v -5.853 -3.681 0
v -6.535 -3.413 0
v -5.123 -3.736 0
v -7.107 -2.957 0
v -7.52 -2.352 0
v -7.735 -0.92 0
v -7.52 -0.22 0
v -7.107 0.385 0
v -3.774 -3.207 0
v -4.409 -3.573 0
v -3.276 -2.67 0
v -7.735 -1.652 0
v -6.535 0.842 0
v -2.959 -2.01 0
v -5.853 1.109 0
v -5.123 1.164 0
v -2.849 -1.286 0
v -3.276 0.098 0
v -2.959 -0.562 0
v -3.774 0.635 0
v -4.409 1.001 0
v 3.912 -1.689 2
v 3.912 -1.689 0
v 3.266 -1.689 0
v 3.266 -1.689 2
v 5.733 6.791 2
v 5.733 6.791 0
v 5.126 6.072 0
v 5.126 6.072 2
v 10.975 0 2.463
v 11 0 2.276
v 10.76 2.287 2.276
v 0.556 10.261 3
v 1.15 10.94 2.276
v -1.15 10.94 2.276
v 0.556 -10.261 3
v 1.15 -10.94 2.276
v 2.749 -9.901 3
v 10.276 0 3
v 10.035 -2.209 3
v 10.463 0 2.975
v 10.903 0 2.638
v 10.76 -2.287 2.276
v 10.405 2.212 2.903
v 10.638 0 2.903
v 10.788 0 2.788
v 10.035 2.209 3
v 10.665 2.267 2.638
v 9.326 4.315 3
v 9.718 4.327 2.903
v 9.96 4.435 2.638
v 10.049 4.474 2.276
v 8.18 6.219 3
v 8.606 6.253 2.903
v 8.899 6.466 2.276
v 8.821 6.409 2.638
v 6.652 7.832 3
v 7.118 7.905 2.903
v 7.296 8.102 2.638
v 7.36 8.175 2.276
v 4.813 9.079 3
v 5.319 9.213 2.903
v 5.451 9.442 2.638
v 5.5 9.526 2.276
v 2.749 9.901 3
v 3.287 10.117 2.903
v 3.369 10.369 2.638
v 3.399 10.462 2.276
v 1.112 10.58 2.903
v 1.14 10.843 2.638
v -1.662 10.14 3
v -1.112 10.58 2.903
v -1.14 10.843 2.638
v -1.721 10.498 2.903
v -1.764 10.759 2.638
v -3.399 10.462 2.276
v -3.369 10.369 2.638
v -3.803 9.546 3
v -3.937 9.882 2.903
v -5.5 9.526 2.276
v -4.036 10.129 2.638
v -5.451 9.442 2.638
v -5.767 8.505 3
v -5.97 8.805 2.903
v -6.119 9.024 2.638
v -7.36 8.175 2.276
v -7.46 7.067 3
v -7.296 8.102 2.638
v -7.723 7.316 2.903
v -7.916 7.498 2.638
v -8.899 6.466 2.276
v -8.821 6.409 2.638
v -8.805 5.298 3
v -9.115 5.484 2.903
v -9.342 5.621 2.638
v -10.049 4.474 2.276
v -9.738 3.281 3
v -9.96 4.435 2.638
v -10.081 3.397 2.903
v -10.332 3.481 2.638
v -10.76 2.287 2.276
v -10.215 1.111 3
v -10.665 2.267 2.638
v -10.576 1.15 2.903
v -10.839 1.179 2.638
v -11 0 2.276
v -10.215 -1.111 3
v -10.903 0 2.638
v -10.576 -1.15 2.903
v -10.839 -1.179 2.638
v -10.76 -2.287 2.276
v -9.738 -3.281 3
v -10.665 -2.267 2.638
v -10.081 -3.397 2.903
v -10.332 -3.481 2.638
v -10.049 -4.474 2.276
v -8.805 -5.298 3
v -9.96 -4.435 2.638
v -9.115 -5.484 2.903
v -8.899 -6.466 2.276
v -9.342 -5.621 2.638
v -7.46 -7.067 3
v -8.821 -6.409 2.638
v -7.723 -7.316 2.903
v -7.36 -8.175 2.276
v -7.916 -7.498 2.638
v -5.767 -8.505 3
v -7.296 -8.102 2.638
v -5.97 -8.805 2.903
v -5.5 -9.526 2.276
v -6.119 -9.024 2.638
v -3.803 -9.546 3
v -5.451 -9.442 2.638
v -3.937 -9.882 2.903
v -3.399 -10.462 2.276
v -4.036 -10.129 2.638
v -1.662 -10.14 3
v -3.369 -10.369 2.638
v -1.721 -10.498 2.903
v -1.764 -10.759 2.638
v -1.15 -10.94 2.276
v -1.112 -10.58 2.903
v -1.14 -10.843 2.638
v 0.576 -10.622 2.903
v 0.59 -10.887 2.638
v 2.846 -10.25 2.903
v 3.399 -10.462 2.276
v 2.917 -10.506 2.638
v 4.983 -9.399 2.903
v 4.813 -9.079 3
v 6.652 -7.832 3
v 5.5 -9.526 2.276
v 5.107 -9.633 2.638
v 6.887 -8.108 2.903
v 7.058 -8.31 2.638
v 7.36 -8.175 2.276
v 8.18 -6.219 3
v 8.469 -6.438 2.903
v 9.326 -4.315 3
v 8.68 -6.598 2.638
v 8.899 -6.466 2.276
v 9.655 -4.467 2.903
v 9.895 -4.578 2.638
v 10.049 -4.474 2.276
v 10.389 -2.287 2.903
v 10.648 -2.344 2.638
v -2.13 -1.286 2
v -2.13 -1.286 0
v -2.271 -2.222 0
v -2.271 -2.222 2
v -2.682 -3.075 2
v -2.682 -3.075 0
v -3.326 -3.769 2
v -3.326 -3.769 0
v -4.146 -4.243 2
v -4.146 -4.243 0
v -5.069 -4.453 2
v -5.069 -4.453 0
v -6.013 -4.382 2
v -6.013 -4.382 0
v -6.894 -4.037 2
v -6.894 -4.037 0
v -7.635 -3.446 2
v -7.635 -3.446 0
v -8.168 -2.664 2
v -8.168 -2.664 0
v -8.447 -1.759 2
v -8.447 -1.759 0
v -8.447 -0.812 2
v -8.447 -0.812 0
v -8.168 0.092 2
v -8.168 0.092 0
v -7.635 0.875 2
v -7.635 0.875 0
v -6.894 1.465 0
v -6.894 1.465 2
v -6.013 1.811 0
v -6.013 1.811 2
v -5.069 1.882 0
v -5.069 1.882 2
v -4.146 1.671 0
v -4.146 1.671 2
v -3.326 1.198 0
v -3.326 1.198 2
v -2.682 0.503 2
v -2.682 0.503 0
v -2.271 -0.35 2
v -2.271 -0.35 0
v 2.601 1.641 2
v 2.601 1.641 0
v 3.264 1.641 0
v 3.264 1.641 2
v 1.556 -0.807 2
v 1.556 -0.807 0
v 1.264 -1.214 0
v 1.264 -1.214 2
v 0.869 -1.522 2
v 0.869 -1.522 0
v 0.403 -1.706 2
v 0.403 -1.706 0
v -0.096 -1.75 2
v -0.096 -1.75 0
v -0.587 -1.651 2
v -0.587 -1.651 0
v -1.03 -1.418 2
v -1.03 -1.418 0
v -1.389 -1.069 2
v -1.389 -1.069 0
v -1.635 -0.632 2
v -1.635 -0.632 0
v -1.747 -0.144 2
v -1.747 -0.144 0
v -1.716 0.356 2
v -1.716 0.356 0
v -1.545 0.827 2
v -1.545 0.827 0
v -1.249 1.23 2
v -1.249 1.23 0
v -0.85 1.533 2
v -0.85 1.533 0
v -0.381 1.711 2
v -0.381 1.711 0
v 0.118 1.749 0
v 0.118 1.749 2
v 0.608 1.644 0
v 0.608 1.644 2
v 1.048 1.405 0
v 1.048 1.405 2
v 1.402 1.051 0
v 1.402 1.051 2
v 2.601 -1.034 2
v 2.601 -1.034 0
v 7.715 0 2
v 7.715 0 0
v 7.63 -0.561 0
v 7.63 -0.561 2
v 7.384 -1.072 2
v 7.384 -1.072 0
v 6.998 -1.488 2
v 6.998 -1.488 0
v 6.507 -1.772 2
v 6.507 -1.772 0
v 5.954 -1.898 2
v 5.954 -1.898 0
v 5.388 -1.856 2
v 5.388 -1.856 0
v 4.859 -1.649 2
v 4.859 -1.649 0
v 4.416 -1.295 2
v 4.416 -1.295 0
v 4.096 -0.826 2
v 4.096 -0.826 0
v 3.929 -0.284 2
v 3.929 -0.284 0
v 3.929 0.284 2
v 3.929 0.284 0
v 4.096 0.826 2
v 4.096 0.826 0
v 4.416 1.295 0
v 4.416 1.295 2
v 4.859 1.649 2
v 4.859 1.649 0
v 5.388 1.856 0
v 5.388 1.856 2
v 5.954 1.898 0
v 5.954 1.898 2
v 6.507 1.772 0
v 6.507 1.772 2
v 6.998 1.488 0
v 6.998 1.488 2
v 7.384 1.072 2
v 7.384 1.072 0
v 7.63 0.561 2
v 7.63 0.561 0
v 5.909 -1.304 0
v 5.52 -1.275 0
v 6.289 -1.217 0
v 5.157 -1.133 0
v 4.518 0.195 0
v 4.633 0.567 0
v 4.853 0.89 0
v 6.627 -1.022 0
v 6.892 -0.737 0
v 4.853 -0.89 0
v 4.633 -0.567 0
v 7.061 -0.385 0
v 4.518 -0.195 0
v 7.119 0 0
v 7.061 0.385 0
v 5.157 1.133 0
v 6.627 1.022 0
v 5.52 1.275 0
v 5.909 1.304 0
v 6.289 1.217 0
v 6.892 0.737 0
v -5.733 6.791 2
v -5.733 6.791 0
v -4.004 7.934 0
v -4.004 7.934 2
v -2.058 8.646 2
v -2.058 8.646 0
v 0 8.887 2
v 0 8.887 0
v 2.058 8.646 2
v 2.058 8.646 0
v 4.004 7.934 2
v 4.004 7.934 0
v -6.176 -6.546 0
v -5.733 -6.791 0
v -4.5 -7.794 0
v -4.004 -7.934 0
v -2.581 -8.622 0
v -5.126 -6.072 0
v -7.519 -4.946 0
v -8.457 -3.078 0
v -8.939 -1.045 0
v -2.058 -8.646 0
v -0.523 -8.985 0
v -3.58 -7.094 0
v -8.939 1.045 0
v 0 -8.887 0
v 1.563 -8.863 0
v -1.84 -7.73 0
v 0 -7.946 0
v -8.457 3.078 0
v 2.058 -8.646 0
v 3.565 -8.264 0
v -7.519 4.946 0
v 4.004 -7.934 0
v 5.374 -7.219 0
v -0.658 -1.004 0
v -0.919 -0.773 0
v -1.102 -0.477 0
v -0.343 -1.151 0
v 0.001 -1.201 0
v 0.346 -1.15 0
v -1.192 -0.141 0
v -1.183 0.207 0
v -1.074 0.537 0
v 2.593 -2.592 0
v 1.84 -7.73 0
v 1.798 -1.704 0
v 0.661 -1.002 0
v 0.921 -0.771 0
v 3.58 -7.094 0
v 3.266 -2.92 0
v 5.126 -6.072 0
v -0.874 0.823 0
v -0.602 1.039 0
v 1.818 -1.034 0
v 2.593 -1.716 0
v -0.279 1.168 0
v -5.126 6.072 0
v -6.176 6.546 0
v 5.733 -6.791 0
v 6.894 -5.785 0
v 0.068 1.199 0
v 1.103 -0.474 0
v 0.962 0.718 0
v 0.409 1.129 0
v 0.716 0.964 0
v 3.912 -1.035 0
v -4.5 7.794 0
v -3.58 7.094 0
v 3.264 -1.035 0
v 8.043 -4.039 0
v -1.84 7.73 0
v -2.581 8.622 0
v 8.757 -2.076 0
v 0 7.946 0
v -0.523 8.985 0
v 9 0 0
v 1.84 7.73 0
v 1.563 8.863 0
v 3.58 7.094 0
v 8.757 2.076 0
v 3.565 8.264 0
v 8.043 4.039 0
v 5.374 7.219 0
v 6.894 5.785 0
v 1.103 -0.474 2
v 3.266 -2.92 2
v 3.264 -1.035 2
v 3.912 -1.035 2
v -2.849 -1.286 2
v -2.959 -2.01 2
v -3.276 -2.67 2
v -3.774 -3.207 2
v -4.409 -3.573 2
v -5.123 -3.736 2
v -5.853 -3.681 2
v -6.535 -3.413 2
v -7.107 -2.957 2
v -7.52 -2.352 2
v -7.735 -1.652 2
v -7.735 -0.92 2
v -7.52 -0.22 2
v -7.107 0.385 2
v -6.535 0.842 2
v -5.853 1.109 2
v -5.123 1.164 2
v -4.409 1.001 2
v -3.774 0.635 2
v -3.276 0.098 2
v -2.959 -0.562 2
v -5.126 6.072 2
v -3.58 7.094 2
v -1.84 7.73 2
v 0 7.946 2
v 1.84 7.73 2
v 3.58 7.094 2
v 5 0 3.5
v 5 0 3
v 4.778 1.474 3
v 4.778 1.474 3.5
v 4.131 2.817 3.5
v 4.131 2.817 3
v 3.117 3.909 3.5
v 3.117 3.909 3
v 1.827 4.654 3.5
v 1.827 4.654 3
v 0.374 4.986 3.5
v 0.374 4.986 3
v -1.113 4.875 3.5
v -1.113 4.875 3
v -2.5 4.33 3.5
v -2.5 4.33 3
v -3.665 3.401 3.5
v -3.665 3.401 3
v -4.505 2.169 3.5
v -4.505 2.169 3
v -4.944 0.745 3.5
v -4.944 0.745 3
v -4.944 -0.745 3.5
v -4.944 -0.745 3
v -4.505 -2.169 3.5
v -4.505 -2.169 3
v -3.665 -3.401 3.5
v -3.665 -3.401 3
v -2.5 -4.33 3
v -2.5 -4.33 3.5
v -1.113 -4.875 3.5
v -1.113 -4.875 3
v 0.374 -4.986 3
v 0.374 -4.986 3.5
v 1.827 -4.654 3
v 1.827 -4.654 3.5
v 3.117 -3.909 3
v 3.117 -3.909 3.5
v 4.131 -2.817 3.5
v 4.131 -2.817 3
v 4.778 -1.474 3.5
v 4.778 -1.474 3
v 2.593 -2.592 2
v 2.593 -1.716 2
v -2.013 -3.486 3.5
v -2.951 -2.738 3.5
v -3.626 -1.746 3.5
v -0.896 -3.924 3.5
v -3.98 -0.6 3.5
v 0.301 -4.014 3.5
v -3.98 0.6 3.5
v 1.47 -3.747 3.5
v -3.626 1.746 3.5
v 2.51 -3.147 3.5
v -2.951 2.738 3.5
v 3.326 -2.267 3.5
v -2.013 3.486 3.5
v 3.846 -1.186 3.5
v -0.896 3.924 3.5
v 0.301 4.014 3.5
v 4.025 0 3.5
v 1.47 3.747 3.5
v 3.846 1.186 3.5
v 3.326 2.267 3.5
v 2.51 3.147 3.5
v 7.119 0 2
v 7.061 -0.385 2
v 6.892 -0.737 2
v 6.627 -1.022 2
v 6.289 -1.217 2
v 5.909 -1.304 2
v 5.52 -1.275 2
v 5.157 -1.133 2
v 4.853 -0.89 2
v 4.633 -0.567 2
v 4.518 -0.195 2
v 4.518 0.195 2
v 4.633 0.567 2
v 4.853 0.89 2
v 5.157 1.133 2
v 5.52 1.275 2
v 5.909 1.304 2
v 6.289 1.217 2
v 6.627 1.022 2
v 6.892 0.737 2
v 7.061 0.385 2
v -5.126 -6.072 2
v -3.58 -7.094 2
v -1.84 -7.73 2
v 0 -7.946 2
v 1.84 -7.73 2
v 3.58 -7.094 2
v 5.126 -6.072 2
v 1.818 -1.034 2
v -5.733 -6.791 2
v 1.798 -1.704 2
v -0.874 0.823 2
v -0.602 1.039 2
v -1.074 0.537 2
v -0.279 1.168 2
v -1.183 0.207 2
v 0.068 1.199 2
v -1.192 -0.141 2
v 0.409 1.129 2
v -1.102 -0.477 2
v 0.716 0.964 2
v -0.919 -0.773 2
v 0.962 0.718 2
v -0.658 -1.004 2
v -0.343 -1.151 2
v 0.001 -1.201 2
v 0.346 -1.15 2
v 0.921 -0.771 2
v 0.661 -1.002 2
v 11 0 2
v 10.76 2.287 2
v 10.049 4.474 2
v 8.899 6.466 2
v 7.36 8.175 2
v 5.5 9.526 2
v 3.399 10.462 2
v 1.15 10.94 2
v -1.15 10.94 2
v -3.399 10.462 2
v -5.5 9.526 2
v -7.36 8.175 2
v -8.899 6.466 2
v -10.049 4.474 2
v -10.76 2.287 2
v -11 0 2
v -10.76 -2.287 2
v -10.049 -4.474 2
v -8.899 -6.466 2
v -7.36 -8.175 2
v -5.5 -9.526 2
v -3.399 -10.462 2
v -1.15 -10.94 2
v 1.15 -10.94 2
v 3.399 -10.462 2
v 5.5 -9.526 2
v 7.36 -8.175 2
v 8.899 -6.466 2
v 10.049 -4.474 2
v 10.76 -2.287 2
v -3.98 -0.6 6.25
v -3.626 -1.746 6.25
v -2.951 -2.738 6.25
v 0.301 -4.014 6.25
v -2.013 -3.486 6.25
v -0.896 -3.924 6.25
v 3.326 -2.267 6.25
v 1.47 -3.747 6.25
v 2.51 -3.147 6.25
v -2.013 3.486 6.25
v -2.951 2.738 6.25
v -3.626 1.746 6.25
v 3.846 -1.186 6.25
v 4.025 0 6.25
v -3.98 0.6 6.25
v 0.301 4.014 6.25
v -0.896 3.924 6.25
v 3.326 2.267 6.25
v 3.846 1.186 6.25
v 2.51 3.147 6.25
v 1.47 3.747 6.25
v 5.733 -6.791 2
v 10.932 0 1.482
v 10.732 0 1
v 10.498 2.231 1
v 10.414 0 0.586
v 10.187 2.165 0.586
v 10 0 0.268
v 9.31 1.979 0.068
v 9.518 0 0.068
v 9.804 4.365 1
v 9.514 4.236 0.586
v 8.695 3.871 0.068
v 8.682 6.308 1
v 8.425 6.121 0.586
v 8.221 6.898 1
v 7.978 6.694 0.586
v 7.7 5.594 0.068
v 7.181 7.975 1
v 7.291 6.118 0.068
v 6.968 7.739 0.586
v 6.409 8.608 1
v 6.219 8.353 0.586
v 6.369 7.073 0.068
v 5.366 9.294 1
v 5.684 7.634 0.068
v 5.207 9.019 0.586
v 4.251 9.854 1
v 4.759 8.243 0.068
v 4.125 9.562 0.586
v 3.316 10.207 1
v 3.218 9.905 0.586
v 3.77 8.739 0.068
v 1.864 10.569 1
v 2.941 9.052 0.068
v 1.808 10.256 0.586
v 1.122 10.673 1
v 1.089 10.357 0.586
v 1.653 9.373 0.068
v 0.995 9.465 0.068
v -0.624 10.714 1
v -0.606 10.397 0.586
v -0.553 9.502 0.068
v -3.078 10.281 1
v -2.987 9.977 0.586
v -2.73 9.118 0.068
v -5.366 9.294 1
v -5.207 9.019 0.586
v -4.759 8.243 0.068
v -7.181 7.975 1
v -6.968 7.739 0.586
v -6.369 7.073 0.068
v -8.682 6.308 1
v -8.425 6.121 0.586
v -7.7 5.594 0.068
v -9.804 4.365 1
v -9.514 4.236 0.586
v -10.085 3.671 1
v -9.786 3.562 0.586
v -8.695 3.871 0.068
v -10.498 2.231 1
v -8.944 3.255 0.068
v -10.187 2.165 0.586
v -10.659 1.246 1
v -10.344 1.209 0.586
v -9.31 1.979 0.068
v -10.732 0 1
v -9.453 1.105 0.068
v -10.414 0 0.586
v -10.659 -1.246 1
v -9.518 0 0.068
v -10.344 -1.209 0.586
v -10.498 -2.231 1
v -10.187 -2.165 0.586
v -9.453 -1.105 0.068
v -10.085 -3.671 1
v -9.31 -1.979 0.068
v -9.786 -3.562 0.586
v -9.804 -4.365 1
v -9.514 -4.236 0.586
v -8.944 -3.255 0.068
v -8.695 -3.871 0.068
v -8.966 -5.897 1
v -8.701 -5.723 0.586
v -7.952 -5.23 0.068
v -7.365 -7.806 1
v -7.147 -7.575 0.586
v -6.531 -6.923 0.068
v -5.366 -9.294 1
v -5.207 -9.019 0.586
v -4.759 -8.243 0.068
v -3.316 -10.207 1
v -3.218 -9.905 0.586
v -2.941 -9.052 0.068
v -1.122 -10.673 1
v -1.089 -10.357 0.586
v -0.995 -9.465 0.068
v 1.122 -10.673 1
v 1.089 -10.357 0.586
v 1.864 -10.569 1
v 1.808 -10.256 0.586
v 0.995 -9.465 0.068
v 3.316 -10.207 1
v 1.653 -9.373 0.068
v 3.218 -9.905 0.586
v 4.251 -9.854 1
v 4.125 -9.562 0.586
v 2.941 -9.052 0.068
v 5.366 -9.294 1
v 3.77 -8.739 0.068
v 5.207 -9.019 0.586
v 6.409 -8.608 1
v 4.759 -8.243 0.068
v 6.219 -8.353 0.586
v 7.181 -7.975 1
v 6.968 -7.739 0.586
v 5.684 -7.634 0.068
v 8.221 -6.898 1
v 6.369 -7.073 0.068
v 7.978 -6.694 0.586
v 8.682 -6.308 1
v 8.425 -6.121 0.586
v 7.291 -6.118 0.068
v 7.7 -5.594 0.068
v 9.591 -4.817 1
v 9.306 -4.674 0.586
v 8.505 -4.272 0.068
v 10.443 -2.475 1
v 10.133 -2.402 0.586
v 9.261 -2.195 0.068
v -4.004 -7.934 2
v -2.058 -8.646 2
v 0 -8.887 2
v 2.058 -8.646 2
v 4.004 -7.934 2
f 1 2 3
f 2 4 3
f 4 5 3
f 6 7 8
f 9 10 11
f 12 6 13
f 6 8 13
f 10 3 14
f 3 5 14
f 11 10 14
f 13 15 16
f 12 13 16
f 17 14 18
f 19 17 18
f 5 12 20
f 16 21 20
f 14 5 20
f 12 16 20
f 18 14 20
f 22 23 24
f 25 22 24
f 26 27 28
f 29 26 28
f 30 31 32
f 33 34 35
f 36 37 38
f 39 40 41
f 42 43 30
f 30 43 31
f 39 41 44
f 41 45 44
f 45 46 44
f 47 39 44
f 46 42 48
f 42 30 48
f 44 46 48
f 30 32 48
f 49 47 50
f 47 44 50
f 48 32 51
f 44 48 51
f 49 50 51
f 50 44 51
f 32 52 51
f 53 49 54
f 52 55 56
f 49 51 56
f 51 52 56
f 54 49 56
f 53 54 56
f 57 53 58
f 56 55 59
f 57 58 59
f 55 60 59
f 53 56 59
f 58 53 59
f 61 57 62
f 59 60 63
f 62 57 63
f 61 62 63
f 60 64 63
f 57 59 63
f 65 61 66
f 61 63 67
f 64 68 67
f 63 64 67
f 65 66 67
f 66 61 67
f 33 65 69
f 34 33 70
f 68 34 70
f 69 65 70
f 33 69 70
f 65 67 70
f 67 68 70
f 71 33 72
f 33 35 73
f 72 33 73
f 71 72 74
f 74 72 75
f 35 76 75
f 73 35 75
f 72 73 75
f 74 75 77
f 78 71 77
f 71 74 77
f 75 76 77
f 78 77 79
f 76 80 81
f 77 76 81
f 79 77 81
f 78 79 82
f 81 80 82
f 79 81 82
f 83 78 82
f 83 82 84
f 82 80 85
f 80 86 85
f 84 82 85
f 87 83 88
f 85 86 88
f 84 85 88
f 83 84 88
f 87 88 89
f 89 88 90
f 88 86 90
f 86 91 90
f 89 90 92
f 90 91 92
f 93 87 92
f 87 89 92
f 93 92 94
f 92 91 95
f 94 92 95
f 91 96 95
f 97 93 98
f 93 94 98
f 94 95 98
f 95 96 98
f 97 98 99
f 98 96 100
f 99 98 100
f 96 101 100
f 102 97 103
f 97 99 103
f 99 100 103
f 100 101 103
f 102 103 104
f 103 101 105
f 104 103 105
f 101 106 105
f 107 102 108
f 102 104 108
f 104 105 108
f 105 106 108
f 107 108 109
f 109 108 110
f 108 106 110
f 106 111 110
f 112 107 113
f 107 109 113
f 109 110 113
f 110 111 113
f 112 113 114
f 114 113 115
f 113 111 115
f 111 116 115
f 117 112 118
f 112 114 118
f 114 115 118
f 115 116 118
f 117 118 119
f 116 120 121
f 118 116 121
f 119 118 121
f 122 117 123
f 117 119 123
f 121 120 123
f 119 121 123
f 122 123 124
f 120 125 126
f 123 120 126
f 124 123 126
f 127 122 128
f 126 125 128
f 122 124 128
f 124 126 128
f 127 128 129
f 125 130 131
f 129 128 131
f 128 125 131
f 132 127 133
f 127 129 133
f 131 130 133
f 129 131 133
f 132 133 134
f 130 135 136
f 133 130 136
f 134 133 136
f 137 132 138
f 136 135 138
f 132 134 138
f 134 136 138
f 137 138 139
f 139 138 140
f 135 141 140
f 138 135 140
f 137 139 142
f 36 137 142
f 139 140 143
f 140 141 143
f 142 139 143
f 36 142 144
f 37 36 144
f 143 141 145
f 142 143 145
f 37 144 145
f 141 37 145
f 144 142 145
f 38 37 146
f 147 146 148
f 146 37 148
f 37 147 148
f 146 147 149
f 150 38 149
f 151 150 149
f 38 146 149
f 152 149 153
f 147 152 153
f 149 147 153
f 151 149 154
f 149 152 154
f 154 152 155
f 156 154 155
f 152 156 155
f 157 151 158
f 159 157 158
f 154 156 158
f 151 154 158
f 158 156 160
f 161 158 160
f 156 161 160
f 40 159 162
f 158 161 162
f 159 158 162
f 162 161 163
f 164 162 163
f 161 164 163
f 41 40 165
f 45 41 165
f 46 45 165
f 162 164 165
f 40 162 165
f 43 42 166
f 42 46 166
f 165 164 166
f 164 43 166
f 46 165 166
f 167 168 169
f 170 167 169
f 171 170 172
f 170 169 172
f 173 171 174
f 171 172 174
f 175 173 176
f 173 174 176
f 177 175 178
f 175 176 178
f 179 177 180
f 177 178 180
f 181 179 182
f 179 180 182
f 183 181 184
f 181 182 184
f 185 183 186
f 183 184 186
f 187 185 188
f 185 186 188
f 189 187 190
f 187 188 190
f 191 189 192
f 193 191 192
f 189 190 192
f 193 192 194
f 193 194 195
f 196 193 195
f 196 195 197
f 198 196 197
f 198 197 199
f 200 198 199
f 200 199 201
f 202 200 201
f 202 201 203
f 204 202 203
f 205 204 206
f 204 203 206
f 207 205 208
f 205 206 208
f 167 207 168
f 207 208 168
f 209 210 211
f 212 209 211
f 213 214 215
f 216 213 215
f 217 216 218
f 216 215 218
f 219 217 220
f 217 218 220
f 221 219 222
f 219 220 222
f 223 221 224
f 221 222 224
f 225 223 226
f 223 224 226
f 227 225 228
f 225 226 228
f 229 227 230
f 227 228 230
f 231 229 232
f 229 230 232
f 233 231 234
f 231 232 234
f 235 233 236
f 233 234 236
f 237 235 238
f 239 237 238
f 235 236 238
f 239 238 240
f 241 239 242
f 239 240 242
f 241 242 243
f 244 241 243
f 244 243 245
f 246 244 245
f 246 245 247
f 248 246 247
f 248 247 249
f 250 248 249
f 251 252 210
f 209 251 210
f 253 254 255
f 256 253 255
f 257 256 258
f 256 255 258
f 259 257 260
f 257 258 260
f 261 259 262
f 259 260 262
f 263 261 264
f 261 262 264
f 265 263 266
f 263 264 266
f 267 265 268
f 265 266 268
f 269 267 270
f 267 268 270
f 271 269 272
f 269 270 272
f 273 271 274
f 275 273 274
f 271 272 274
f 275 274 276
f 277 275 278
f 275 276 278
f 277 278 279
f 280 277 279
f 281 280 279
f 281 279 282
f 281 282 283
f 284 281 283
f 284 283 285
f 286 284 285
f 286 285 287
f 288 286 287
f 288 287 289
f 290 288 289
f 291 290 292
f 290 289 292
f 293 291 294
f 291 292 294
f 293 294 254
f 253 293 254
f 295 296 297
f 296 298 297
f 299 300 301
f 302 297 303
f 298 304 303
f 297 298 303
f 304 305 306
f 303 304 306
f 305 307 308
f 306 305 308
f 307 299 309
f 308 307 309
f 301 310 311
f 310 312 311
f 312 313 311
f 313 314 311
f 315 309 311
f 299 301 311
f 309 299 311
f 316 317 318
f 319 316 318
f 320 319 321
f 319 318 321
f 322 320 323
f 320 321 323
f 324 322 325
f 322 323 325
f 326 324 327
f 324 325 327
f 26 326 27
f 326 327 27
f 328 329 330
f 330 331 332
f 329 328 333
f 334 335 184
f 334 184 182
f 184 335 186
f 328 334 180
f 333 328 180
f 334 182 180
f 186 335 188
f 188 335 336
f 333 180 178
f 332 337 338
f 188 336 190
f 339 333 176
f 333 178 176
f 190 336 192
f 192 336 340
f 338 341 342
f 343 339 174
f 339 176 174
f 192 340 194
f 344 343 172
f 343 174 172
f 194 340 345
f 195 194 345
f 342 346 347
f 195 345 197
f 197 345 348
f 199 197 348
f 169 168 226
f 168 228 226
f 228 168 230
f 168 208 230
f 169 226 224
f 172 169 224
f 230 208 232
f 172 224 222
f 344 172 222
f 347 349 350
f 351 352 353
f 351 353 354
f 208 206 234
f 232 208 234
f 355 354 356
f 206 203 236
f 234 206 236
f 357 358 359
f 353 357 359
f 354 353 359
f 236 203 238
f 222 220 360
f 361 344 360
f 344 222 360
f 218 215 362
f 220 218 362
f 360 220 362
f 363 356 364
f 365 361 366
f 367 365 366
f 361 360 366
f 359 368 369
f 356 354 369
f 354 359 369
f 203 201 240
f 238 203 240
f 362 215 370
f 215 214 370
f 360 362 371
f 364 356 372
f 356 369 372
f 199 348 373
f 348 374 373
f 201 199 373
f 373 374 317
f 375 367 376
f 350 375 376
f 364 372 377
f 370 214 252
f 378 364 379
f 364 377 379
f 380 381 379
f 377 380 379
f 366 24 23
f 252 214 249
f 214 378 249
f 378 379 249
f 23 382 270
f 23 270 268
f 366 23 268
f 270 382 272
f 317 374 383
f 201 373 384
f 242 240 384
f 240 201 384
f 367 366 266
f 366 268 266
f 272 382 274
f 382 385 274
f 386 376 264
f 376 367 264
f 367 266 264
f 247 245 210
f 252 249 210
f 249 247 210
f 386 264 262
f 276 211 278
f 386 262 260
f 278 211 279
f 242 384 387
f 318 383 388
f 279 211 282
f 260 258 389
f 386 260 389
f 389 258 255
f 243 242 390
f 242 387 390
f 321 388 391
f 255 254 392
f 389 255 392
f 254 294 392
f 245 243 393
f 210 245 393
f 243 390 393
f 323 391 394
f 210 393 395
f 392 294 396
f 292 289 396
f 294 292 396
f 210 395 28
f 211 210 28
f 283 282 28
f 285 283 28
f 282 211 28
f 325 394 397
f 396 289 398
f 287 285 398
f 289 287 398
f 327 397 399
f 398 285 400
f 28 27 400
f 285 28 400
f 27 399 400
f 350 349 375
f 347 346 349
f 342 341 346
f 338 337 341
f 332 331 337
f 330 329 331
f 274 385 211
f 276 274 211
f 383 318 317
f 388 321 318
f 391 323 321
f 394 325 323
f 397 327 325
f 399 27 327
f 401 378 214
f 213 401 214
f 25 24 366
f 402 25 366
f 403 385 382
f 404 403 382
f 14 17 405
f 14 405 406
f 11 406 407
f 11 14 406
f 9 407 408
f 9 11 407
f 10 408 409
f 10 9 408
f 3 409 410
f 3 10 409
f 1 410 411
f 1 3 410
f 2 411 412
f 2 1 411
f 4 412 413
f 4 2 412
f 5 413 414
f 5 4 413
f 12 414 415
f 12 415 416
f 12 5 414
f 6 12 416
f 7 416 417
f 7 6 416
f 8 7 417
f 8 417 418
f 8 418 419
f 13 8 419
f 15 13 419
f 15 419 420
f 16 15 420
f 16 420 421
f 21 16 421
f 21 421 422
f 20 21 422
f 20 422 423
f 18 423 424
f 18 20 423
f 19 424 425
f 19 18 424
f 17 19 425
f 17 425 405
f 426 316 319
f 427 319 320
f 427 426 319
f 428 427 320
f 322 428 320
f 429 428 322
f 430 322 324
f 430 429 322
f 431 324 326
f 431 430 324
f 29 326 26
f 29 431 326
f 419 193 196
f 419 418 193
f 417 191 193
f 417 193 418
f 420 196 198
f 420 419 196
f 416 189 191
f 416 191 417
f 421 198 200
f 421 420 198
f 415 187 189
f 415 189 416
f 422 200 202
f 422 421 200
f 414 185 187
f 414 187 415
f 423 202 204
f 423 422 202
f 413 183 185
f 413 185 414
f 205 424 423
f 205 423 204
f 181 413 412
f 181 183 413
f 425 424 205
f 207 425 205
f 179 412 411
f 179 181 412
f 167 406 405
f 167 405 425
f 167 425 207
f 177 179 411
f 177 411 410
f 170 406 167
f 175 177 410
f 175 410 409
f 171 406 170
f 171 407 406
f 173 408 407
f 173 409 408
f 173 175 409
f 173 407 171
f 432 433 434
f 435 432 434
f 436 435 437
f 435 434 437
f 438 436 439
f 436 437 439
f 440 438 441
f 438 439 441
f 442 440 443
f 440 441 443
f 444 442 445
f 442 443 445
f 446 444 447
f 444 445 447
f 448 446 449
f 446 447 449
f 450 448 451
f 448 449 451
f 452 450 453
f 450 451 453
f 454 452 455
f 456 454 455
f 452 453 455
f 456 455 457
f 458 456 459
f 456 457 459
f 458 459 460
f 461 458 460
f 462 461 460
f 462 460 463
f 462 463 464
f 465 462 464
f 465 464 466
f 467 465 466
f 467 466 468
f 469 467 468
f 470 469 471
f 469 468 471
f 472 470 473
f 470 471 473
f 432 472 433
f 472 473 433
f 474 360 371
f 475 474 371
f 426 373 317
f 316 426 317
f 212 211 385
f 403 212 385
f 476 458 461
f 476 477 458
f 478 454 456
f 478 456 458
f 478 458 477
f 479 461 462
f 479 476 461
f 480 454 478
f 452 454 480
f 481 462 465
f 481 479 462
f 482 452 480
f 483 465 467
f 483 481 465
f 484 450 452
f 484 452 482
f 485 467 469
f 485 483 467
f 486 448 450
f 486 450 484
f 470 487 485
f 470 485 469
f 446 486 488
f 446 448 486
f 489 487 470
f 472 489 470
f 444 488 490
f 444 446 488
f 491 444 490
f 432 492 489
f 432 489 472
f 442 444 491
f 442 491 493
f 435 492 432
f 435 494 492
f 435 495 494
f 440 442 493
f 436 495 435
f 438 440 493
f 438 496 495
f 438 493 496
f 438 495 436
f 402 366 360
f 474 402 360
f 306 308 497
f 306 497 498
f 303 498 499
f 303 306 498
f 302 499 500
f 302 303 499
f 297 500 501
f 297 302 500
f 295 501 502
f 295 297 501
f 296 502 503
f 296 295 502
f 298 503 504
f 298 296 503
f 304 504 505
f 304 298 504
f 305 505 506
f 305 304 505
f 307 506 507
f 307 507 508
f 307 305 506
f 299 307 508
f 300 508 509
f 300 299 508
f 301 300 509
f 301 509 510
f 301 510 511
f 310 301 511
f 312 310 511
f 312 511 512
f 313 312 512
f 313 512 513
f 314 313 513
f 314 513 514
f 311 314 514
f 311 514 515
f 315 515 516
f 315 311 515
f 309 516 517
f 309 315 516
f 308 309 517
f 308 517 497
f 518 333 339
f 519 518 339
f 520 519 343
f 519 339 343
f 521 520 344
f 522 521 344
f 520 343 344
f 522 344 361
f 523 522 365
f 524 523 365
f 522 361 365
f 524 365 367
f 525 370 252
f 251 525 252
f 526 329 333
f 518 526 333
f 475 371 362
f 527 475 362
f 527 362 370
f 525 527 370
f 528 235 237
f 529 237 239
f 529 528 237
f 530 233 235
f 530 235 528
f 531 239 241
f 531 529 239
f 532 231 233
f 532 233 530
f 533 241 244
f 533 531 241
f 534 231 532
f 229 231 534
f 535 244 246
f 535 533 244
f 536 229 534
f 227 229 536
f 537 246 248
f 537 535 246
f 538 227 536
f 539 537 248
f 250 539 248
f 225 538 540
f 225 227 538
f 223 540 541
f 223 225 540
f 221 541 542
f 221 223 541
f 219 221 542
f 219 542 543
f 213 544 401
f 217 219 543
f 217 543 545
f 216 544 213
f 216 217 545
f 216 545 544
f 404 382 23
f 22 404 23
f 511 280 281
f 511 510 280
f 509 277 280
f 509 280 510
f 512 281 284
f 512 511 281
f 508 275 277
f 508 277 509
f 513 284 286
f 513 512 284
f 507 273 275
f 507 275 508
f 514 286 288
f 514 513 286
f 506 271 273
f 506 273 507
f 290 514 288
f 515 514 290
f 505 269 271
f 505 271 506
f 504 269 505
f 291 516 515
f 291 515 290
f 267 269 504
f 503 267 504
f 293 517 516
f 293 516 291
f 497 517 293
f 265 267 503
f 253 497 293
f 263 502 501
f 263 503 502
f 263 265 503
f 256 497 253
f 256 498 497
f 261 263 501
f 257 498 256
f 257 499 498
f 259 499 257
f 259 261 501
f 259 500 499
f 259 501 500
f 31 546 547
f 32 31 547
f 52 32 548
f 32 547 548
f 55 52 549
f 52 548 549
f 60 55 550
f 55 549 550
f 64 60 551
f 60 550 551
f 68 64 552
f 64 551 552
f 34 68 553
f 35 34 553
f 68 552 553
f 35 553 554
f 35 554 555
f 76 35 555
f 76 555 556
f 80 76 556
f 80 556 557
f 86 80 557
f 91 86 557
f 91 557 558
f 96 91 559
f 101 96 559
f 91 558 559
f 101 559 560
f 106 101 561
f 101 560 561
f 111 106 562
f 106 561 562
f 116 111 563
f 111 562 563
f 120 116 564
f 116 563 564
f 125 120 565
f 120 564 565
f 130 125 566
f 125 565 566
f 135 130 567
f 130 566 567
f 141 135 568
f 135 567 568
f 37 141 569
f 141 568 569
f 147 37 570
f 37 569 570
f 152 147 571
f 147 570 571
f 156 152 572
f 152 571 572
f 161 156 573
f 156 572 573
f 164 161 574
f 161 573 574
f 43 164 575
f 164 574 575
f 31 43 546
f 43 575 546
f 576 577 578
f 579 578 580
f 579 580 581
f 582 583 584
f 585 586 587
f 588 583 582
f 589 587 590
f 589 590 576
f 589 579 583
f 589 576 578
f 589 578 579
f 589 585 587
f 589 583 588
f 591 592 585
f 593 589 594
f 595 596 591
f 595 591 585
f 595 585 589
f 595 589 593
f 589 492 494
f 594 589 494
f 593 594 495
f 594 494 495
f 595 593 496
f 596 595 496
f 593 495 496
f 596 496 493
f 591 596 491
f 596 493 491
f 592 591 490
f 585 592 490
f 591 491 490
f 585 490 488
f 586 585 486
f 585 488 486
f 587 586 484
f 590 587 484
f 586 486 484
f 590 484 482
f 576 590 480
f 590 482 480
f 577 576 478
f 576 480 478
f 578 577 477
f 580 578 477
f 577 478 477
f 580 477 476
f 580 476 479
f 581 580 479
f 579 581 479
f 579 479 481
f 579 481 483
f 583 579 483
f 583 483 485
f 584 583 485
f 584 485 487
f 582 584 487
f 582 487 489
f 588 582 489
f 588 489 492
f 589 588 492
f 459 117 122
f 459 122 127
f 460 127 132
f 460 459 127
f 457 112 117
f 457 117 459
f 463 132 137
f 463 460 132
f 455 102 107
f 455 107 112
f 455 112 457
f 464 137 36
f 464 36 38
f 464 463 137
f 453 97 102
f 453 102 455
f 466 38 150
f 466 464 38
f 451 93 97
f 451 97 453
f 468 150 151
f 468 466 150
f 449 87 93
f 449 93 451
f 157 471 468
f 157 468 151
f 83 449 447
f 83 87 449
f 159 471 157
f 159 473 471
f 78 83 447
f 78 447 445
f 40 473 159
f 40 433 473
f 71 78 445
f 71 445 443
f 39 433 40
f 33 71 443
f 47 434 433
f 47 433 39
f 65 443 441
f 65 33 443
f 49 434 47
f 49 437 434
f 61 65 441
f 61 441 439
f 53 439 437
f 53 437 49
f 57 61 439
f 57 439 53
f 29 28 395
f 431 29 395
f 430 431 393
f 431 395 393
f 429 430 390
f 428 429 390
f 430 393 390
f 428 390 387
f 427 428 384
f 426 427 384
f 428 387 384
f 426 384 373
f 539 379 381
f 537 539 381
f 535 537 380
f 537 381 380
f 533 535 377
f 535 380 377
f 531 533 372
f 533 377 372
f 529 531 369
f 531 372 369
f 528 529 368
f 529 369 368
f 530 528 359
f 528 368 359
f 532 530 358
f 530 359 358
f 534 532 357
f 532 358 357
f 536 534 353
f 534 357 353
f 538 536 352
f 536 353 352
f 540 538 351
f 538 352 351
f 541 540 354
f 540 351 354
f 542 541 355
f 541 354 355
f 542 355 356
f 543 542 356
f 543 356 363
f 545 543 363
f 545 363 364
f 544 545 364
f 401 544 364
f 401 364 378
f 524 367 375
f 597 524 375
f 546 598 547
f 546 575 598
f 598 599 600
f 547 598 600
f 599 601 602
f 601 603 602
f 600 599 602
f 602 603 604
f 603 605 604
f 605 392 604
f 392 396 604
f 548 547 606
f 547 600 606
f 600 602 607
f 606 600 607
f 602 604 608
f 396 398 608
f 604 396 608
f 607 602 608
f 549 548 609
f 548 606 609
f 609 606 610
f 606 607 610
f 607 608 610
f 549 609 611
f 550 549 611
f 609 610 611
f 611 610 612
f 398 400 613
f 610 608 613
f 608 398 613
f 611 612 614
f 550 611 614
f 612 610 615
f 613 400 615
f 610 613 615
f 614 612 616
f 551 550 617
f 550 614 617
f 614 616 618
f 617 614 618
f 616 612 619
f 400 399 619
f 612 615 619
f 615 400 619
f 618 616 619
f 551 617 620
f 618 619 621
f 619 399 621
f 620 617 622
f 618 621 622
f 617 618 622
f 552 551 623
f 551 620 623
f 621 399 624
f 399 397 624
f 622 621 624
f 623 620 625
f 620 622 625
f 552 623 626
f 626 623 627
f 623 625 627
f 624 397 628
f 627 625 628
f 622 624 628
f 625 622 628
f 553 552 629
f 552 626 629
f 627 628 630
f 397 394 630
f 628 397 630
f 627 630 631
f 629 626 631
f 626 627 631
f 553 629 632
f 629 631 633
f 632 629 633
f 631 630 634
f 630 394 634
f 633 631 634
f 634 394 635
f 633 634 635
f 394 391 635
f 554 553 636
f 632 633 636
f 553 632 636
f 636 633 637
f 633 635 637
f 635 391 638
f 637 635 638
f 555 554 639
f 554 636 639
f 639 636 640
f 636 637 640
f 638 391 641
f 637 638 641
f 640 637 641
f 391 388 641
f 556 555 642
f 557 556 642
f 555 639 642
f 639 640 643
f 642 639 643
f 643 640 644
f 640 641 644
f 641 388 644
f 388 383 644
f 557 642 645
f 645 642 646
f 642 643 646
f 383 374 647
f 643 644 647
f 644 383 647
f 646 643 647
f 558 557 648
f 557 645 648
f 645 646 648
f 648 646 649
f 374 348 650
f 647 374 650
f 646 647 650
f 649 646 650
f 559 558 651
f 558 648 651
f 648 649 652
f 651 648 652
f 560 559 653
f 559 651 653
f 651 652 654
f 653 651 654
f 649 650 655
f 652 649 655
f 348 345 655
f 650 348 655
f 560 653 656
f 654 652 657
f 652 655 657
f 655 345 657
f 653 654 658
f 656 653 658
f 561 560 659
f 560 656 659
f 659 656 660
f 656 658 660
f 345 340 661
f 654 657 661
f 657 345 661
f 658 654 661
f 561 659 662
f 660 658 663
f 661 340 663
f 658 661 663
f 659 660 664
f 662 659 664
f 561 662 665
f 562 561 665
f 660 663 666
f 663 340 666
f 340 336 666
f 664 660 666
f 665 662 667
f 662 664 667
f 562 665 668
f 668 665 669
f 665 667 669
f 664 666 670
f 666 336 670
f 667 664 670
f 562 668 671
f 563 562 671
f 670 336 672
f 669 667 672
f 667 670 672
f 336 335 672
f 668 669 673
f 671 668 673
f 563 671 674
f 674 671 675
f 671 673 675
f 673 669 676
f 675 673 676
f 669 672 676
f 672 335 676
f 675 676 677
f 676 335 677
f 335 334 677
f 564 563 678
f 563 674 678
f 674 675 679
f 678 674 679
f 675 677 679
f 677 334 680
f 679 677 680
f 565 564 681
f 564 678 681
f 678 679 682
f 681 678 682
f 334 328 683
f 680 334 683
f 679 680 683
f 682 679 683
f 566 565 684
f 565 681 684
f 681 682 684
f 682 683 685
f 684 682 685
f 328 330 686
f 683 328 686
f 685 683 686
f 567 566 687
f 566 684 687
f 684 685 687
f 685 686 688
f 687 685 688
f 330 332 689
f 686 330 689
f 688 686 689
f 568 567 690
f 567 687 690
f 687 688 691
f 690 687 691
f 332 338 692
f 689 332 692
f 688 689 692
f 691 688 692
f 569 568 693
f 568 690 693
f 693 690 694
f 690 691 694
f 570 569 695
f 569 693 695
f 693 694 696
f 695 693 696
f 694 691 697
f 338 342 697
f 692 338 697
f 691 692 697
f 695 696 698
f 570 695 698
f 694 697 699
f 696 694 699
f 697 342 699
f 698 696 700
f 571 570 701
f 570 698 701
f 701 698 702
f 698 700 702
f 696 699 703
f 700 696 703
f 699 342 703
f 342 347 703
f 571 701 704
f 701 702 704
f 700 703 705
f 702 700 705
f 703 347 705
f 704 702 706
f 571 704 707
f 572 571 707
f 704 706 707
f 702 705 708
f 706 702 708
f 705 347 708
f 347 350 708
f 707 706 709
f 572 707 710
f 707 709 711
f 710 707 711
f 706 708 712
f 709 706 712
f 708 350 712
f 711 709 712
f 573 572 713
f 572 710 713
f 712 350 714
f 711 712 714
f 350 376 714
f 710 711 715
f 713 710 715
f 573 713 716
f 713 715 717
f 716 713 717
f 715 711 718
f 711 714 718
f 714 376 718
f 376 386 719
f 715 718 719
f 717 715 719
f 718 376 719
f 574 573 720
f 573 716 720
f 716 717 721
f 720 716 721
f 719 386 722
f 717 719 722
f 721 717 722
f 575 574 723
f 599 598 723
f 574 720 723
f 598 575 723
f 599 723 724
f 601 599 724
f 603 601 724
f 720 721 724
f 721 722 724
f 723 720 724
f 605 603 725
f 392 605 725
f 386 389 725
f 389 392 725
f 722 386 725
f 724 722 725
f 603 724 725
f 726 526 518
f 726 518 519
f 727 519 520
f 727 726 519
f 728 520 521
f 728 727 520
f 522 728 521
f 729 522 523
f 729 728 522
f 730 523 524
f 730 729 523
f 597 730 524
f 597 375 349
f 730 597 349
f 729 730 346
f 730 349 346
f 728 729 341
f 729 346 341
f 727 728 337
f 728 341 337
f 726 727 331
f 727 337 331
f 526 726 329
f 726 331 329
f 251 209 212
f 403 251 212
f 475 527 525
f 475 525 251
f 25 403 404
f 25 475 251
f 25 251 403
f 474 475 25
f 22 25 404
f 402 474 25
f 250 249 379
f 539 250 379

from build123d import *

# Parameters (mm, degrees)
F0_R     = 11
F1_DEPTH = 3
F2_R     = 2
F3_R     = 5
F3_R_2   = 4.025
F4_DEPTH = 0.5
F5_DEPTH = 3.25
F6_R     = 3.1762732241
F6_R_2   = 2.4567004545
F6_R_3   = 1.9037122254
F6_R_4   = 1.3077812171
F7_DEPTH = 2
F8_R     = 0.7242640687


with BuildPart() as f1:
    # F0 (on Top) → F1 (new body)
    with BuildSketch(Plane.XY):
        Circle(F0_R)
    extrude(amount=F1_DEPTH)

    # F2
    f2_edges = [f1.edges().sort_by_distance(p)[0] for p in [
        (-11, 0, 0),
    ]]
    fillet(f2_edges, radius=F2_R)

    # F3 (on face) → F4 (join)
    with BuildSketch(Plane.XY.offset(3)):
        Circle(F3_R)
        Circle(F3_R_2, mode=Mode.SUBTRACT)
    extrude(amount=F4_DEPTH)

    # F5 (add): a face of the model
    f5_faces = [f1.faces().sort_by_distance(p)[0] for p in [
        (0, 0, 3),
    ]]
    extrude(f5_faces, amount=F5_DEPTH)

    # F6 (on face) → F7 (cut)
    with BuildSketch(Plane(origin=(0, 0, 0), x_dir=(1, 0, 0), z_dir=(0, 0, -1))):
        with Locations((-5.3061908111, 1.2858043192)):
            Circle(F6_R)
        with Locations((-5.3061908111, 1.2858043192)):
            Circle(F6_R_2, mode=Mode.SUBTRACT)
        with BuildLine():
            ThreePointArc((0.9619368017, -0.7183409795), (-1.1922548582, 0.140941571), (1.1029175948, 0.4742456667))
            Line((1.1029175948, 0.4742456667), (1.555835095, 0.8067932675))
            ThreePointArc((1.555835095, 0.8067932675), (-1.7466329927, 0.1442615964), (1.4023820255, -1.0511245759))
            Line((1.4023820255, -1.0511245759), (0.9619368017, -0.7183409795))
        make_face()
        Polygon((2.5934469886, 1.7158896108), (1.797987935, 1.7044660048), (1.8175899449, 1.0339289438), (2.6010603178, 1.0339289438), (2.6010603178, -1.6414519632), (3.2636339311, -1.6414519632), (3.2636339311, 1.0350090452), (3.9116484113, 1.0350090452), (3.9116484113, 1.688883407), (3.2656819094, 1.688883407), (3.2656819094, 2.9203571675), (2.5934469886, 2.5919371012), align=None)
        with Locations((5.8113215491, 0)):
            Circle(F6_R_3)
        with Locations((5.8113215491, 0)):
            Circle(F6_R_4, mode=Mode.SUBTRACT)
        with BuildLine():
            Line((5.1257074847, 6.0719344417), (5.7329160736, 6.7912362658))
            ThreePointArc((5.7329160736, 6.7912362658), (0, 8.8874752728), (-5.7329160736, 6.7912362658))
            Line((-5.7329160736, 6.7912362658), (-5.1257074847, 6.0719344417))
            ThreePointArc((-5.1257074847, 6.0719344417), (0, 7.9461478141), (5.1257074847, 6.0719344417))
        make_face()
        with BuildLine():
            ThreePointArc((5.1257074847, -6.0719344417), (0, -7.9461478141), (-5.1257074847, -6.0719344417))
            Line((-5.1257074847, -6.0719344417), (-5.7329160736, -6.7912362658))
            ThreePointArc((-5.7329160736, -6.7912362658), (0, -8.8874752728), (5.7329160736, -6.7912362658))
            Line((5.7329160736, -6.7912362658), (5.1257074847, -6.0719344417))
        make_face()
    extrude(amount=-F7_DEPTH, mode=Mode.SUBTRACT)

    # F8
    f8_edges = [f1.edges().sort_by_distance(p)[0] for p in [
        (-11, 0, 3),
    ]]
    fillet(f8_edges, radius=F8_R)


solid = f1.part
